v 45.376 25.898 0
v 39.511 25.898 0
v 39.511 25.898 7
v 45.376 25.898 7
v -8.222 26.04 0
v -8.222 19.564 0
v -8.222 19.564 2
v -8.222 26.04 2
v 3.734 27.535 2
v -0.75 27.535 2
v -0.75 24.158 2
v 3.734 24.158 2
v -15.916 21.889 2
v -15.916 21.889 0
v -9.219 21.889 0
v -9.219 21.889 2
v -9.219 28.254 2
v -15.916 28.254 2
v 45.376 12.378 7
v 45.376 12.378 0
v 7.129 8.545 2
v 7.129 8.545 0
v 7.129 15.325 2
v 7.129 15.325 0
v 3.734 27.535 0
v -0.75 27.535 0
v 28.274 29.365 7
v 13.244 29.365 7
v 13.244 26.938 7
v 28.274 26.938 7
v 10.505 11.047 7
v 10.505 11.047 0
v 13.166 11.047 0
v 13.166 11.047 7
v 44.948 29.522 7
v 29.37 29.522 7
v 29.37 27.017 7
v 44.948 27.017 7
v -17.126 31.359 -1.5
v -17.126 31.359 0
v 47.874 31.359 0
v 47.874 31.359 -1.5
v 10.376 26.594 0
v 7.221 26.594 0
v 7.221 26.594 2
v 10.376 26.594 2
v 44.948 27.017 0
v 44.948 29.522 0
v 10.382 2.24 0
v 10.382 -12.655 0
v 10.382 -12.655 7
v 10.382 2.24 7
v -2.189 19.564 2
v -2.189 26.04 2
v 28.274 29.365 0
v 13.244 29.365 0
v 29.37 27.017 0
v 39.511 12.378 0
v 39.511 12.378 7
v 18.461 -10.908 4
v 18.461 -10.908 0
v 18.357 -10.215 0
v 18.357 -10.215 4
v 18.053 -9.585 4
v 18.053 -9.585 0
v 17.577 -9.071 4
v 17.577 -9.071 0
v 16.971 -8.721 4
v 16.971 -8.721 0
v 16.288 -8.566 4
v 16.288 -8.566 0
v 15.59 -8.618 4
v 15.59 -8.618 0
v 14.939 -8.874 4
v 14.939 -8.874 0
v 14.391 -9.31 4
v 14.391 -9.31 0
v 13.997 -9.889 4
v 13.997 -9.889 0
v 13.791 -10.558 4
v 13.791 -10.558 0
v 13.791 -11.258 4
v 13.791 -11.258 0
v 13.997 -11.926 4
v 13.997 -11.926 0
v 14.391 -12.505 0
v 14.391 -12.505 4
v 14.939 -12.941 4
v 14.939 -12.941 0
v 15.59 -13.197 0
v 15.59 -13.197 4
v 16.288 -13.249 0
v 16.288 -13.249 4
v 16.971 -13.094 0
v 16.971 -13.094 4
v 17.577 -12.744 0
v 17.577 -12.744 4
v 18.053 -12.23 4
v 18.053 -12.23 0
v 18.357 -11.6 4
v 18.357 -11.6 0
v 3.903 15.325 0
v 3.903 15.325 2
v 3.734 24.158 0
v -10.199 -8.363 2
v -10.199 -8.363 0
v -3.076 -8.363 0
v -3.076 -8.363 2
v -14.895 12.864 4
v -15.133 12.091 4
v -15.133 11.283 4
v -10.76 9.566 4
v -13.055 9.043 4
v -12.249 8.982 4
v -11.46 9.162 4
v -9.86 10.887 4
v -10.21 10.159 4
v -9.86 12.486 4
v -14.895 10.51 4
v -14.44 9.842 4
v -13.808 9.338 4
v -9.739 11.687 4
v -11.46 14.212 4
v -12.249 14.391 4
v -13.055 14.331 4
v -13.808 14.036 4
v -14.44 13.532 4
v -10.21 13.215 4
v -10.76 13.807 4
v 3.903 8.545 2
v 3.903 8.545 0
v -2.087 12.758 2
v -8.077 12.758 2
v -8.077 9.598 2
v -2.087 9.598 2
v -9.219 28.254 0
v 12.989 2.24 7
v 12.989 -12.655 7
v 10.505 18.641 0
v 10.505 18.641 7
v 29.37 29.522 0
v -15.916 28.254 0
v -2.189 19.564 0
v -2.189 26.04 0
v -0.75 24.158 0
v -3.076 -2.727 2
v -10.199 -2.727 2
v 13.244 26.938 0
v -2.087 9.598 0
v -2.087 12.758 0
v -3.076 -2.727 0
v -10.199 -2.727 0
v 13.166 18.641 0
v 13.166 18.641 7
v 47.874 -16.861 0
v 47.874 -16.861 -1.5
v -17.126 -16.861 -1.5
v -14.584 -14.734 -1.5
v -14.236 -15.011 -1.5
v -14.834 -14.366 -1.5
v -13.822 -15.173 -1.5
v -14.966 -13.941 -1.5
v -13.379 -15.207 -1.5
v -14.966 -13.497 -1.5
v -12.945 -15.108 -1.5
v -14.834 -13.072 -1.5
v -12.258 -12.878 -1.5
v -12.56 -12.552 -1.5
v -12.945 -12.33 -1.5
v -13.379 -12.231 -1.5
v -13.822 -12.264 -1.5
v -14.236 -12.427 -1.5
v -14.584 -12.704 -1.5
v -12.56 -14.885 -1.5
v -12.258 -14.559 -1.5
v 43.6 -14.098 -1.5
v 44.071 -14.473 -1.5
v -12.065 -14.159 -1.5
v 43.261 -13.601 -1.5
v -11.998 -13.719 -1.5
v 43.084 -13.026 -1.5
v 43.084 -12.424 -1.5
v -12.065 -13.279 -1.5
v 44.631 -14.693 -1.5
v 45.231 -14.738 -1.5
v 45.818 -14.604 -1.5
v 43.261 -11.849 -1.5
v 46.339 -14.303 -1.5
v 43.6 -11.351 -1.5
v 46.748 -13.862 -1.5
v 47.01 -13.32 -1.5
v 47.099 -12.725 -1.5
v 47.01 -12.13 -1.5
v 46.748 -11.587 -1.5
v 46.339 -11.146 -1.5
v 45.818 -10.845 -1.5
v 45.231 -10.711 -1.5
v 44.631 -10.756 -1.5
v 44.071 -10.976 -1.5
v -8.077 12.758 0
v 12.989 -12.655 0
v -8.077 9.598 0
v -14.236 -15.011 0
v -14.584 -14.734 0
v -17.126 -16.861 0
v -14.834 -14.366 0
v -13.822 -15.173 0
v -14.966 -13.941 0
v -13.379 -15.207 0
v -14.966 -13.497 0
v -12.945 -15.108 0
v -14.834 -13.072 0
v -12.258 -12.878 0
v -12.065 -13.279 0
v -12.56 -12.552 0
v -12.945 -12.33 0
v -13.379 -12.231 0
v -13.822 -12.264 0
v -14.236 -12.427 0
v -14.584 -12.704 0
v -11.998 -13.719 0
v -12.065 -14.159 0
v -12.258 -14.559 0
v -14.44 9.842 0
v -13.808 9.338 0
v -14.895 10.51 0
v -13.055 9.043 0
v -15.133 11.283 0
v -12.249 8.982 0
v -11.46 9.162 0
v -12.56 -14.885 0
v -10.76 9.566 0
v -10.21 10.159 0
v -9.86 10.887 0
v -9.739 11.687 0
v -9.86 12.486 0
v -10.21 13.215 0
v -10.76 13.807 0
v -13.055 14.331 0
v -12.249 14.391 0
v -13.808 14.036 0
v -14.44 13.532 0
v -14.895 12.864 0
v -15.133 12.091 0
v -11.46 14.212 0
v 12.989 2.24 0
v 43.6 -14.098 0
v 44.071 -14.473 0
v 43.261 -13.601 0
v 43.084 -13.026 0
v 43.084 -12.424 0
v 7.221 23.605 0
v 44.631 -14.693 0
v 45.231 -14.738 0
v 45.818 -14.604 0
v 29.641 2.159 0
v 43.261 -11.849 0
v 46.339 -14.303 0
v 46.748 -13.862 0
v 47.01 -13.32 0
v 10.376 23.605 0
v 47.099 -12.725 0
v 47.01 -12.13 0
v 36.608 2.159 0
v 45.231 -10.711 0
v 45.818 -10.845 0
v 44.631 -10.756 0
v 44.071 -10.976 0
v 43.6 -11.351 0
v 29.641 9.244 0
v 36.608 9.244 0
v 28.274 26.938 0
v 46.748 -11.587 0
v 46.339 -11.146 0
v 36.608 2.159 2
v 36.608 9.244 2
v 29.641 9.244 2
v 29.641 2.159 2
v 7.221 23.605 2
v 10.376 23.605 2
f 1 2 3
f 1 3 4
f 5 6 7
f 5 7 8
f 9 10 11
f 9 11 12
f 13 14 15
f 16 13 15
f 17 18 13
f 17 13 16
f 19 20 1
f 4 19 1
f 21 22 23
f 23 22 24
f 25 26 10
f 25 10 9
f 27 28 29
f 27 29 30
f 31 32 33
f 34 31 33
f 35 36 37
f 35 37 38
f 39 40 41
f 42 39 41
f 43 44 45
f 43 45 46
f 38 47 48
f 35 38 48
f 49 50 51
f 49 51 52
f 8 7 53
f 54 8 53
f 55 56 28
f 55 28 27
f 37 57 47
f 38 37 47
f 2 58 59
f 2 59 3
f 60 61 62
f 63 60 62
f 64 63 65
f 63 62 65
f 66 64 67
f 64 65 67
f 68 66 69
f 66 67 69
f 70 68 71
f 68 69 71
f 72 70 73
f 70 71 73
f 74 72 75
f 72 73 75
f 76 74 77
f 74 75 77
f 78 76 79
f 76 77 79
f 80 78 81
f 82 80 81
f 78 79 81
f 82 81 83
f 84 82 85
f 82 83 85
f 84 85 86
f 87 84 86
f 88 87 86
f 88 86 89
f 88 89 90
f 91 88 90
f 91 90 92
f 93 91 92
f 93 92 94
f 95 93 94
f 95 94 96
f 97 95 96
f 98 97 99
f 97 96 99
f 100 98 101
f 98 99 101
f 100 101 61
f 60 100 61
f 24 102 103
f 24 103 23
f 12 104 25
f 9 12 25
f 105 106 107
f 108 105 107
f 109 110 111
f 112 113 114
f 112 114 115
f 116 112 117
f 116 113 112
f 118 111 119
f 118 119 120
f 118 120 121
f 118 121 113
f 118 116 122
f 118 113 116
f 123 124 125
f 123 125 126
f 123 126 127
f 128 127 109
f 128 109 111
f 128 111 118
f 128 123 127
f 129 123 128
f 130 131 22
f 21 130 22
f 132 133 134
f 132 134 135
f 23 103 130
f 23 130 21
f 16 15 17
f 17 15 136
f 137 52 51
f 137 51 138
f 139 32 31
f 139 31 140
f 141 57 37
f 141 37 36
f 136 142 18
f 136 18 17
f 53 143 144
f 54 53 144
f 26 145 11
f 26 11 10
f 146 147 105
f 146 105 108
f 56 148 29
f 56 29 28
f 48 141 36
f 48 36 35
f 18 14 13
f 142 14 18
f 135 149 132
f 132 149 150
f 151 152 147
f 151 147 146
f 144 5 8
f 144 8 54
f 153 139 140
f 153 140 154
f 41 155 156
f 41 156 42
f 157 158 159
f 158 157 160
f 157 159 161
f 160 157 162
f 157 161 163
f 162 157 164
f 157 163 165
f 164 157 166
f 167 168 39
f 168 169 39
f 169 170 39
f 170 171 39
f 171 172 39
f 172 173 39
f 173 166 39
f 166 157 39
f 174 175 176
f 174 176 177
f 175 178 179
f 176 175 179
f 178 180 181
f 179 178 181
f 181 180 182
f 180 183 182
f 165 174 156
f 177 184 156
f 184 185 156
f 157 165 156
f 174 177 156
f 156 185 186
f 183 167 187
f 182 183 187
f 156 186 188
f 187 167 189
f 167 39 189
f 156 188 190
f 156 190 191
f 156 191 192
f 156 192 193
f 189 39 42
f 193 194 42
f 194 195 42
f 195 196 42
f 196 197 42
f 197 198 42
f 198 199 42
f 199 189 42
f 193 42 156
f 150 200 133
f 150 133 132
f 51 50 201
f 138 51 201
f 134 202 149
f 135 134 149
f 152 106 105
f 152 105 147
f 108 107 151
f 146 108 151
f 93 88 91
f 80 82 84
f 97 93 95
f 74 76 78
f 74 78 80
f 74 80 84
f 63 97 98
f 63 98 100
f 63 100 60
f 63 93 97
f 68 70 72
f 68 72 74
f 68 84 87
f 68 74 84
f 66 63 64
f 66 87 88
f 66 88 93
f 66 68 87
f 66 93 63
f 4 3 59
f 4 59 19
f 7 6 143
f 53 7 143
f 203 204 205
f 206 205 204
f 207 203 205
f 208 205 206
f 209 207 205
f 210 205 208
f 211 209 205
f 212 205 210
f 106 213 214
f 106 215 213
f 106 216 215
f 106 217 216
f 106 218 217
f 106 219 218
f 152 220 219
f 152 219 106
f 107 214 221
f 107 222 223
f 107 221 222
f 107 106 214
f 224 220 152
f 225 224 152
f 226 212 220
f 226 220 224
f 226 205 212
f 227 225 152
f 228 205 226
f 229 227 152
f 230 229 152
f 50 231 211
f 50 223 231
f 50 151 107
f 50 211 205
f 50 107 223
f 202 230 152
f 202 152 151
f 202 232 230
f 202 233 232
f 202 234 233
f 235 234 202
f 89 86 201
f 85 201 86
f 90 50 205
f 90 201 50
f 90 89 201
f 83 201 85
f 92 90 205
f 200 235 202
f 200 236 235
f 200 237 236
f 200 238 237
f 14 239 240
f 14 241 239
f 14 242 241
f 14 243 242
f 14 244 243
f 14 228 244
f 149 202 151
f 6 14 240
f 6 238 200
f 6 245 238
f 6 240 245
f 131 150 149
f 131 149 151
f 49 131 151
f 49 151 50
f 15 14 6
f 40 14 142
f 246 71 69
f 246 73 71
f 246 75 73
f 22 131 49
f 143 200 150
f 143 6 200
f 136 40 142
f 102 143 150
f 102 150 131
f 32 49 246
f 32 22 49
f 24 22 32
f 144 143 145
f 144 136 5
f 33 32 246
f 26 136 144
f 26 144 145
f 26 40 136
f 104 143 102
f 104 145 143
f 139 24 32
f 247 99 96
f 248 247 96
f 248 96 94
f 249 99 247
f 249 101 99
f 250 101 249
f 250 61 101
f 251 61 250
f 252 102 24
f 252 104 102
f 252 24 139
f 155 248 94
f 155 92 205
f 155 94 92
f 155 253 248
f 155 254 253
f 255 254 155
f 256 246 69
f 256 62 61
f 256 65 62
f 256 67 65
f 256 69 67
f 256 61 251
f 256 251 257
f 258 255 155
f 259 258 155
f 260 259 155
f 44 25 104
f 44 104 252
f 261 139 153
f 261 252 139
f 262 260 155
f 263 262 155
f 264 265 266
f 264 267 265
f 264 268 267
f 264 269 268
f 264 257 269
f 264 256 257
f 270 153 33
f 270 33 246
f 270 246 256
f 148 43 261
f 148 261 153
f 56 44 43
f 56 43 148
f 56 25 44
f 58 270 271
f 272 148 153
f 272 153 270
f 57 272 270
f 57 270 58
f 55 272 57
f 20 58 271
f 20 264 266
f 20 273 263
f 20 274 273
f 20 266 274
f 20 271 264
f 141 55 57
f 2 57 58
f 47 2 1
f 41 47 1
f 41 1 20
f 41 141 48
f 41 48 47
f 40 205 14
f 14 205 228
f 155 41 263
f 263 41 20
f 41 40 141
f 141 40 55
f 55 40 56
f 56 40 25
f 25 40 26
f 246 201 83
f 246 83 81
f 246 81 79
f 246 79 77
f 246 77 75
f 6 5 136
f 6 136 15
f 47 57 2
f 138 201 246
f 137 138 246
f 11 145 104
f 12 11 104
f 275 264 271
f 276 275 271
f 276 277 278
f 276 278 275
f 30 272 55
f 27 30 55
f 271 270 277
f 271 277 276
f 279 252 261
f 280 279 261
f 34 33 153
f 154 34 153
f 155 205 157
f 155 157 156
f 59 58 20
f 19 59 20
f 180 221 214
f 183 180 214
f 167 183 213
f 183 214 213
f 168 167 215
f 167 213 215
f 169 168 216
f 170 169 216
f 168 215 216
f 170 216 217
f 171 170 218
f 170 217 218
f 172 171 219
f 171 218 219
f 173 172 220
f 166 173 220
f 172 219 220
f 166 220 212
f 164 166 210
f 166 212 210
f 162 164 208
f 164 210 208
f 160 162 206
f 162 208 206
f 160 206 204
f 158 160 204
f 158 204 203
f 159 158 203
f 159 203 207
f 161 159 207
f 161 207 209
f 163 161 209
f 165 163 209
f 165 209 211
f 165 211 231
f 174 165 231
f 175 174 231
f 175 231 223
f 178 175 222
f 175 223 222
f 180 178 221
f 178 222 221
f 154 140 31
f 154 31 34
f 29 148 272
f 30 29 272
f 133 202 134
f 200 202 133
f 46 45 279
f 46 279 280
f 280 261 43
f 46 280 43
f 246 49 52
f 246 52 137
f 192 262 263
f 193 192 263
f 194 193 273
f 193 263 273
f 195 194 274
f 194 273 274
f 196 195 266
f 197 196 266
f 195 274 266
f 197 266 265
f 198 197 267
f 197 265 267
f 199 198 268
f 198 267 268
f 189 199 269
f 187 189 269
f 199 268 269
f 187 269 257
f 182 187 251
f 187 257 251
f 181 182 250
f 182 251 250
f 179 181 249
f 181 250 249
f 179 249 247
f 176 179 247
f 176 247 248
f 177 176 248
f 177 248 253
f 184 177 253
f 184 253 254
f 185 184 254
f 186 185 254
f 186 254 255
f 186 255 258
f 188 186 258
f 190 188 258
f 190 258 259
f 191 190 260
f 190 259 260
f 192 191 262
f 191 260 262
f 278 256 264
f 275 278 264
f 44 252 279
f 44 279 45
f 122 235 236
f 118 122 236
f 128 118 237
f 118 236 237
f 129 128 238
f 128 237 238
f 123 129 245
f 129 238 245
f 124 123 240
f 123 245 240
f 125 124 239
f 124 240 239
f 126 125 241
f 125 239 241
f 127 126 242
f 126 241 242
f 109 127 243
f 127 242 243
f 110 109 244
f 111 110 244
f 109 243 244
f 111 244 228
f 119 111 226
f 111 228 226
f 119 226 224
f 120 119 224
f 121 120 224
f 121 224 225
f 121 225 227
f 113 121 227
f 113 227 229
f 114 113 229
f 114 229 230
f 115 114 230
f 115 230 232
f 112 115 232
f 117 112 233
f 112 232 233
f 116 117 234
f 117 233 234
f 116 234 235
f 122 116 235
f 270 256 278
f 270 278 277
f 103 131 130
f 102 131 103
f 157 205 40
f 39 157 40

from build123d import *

# Parameters (mm, degrees)
F0_W     = 65
F0_H     = 48.220679
F0_R     = 1.491954
F0_W_2   = 7.12351
F0_H_2   = 5.636183
F0_R_2   = 2.348409
F0_R_3   = 2.019025
F0_W_3   = 6.966946
F0_H_3   = 7.08437
F0_R_4   = 2.712275
F0_W_4   = 5.990132
F0_H_4   = 3.159632
F0_W_5   = 3.225457
F0_H_5   = 6.780042
F0_W_6   = 6.697657
F0_H_6   = 6.365542
F0_W_7   = 6.033428
F0_H_7   = 6.476249
F0_W_8   = 3.155096
F0_H_8   = 2.989037
F0_W_9   = 4.483557
F0_H_9   = 3.376505
F0_W_10  = 5.864762
F0_H_10  = 13.520941
F1_DEPTH = 1.5
F2_DEPTH = 2
F3_DEPTH = 4
F4_DEPTH = 7
F5_W     = 2.606562
F5_H     = 14.894642
F5_W_2   = 2.66153
F5_H_2   = 7.59319
F5_W_3   = 15.029821
F5_H_3   = 2.42669
F5_W_4   = 15.577784
F5_H_4   = 2.504971
F6_DEPTH = 7


with BuildPart() as f1:
    # F0 (on Top) → F1 (new body)
    with BuildSketch(Plane.XY):
        with Locations((15.373986, 7.248863)):
            Rectangle(F0_W, F0_H)
        with Locations((-13.490251, -13.718908)):
            Circle(F0_R, mode=Mode.SUBTRACT)
        with Locations((-6.637482, -5.545355)):
            Rectangle(F0_W_2, F0_H_2, mode=Mode.SUBTRACT)
        with Locations((16.112888, -10.907532)):
            Circle(F0_R_2, mode=Mode.SUBTRACT)
        with Locations((45.080185, -12.724719)):
            Circle(F0_R_3, mode=Mode.SUBTRACT)
        with Locations((33.124202, 5.70149)):
            Rectangle(F0_W_3, F0_H_3, mode=Mode.SUBTRACT)
        with Locations((-12.451392, 11.686808)):
            Circle(F0_R_4, mode=Mode.SUBTRACT)
        with Locations((-5.081796, 11.177822)):
            Rectangle(F0_W_4, F0_H_4, mode=Mode.SUBTRACT)
        with Locations((5.516132, 11.934817)):
            Rectangle(F0_W_5, F0_H_5, mode=Mode.SUBTRACT)
        with Locations((-12.56736, 25.071582)):
            Rectangle(F0_W_6, F0_H_6, mode=Mode.SUBTRACT)
        with Locations((-5.205472, 22.802127)):
            Rectangle(F0_W_7, F0_H_7, mode=Mode.SUBTRACT)
        with Locations((8.798722, 25.099258)):
            Rectangle(F0_W_8, F0_H_8, mode=Mode.SUBTRACT)
        with Locations((1.492187, 25.846517)):
            Rectangle(F0_W_9, F0_H_9, mode=Mode.SUBTRACT)
        with Locations((42.443838, 19.138021)):
            Rectangle(F0_W_10, F0_H_10, mode=Mode.SUBTRACT)
        with Locations((-12.451392, 11.686808)):
            Circle(F0_R_4)
        with Locations((-6.637482, -5.545355)):
            Rectangle(F0_W_2, F0_H_2)
        with Locations((-5.081796, 11.177822)):
            Rectangle(F0_W_4, F0_H_4)
        with Locations((-5.205472, 22.802127)):
            Rectangle(F0_W_7, F0_H_7)
        with Locations((-12.56736, 25.071582)):
            Rectangle(F0_W_6, F0_H_6)
        with Locations((1.492187, 25.846517)):
            Rectangle(F0_W_9, F0_H_9)
        with Locations((5.516132, 11.934817)):
            Rectangle(F0_W_5, F0_H_5)
        with Locations((8.798722, 25.099258)):
            Rectangle(F0_W_8, F0_H_8)
        with Locations((16.112888, -10.907532)):
            Circle(F0_R_2)
        with Locations((33.124202, 5.70149)):
            Rectangle(F0_W_3, F0_H_3)
        with Locations((42.443838, 19.138021)):
            Rectangle(F0_W_10, F0_H_10)
    extrude(amount=-F1_DEPTH)

    # F0 (on Top) → F2 (join)
    with BuildSketch(Plane.XY):
        with Locations((-12.56736, 25.071582)):
            Rectangle(F0_W_6, F0_H_6)
        with Locations((-5.205472, 22.802127)):
            Rectangle(F0_W_7, F0_H_7)
        with Locations((-5.081796, 11.177822)):
            Rectangle(F0_W_4, F0_H_4)
        with Locations((5.516132, 11.934817)):
            Rectangle(F0_W_5, F0_H_5)
        with Locations((1.492187, 25.846517)):
            Rectangle(F0_W_9, F0_H_9)
        with Locations((8.798722, 25.099258)):
            Rectangle(F0_W_8, F0_H_8)
        with Locations((33.124202, 5.70149)):
            Rectangle(F0_W_3, F0_H_3)
        with Locations((-6.637482, -5.545355)):
            Rectangle(F0_W_2, F0_H_2)
    extrude(amount=F2_DEPTH)

    # F0 (on Top) → F3 (join)
    with BuildSketch(Plane.XY):
        with Locations((-12.451392, 11.686808)):
            Circle(F0_R_4)
        with Locations((16.112888, -10.907532)):
            Circle(F0_R_2)
    extrude(amount=F3_DEPTH)

    # F0 (on Top) → F4 (join)
    with BuildSketch(Plane.XY):
        with Locations((42.443838, 19.138021)):
            Rectangle(F0_W_10, F0_H_10)
    extrude(amount=F4_DEPTH)

    # F5 (on face) → F6 (join)
    with BuildSketch(Plane.XY):
        with Locations((11.685232, -5.207297)):
            Rectangle(F5_W, F5_H)
        with Locations((11.835448, 14.843981)):
            Rectangle(F5_W_2, F5_H_2)
        with Locations((20.759405, 28.151636)):
            Rectangle(F5_W_3, F5_H_3)
        with Locations((37.159131, 28.269056)):
            Rectangle(F5_W_4, F5_H_4)
    extrude(amount=F6_DEPTH)


solid = f1.part
